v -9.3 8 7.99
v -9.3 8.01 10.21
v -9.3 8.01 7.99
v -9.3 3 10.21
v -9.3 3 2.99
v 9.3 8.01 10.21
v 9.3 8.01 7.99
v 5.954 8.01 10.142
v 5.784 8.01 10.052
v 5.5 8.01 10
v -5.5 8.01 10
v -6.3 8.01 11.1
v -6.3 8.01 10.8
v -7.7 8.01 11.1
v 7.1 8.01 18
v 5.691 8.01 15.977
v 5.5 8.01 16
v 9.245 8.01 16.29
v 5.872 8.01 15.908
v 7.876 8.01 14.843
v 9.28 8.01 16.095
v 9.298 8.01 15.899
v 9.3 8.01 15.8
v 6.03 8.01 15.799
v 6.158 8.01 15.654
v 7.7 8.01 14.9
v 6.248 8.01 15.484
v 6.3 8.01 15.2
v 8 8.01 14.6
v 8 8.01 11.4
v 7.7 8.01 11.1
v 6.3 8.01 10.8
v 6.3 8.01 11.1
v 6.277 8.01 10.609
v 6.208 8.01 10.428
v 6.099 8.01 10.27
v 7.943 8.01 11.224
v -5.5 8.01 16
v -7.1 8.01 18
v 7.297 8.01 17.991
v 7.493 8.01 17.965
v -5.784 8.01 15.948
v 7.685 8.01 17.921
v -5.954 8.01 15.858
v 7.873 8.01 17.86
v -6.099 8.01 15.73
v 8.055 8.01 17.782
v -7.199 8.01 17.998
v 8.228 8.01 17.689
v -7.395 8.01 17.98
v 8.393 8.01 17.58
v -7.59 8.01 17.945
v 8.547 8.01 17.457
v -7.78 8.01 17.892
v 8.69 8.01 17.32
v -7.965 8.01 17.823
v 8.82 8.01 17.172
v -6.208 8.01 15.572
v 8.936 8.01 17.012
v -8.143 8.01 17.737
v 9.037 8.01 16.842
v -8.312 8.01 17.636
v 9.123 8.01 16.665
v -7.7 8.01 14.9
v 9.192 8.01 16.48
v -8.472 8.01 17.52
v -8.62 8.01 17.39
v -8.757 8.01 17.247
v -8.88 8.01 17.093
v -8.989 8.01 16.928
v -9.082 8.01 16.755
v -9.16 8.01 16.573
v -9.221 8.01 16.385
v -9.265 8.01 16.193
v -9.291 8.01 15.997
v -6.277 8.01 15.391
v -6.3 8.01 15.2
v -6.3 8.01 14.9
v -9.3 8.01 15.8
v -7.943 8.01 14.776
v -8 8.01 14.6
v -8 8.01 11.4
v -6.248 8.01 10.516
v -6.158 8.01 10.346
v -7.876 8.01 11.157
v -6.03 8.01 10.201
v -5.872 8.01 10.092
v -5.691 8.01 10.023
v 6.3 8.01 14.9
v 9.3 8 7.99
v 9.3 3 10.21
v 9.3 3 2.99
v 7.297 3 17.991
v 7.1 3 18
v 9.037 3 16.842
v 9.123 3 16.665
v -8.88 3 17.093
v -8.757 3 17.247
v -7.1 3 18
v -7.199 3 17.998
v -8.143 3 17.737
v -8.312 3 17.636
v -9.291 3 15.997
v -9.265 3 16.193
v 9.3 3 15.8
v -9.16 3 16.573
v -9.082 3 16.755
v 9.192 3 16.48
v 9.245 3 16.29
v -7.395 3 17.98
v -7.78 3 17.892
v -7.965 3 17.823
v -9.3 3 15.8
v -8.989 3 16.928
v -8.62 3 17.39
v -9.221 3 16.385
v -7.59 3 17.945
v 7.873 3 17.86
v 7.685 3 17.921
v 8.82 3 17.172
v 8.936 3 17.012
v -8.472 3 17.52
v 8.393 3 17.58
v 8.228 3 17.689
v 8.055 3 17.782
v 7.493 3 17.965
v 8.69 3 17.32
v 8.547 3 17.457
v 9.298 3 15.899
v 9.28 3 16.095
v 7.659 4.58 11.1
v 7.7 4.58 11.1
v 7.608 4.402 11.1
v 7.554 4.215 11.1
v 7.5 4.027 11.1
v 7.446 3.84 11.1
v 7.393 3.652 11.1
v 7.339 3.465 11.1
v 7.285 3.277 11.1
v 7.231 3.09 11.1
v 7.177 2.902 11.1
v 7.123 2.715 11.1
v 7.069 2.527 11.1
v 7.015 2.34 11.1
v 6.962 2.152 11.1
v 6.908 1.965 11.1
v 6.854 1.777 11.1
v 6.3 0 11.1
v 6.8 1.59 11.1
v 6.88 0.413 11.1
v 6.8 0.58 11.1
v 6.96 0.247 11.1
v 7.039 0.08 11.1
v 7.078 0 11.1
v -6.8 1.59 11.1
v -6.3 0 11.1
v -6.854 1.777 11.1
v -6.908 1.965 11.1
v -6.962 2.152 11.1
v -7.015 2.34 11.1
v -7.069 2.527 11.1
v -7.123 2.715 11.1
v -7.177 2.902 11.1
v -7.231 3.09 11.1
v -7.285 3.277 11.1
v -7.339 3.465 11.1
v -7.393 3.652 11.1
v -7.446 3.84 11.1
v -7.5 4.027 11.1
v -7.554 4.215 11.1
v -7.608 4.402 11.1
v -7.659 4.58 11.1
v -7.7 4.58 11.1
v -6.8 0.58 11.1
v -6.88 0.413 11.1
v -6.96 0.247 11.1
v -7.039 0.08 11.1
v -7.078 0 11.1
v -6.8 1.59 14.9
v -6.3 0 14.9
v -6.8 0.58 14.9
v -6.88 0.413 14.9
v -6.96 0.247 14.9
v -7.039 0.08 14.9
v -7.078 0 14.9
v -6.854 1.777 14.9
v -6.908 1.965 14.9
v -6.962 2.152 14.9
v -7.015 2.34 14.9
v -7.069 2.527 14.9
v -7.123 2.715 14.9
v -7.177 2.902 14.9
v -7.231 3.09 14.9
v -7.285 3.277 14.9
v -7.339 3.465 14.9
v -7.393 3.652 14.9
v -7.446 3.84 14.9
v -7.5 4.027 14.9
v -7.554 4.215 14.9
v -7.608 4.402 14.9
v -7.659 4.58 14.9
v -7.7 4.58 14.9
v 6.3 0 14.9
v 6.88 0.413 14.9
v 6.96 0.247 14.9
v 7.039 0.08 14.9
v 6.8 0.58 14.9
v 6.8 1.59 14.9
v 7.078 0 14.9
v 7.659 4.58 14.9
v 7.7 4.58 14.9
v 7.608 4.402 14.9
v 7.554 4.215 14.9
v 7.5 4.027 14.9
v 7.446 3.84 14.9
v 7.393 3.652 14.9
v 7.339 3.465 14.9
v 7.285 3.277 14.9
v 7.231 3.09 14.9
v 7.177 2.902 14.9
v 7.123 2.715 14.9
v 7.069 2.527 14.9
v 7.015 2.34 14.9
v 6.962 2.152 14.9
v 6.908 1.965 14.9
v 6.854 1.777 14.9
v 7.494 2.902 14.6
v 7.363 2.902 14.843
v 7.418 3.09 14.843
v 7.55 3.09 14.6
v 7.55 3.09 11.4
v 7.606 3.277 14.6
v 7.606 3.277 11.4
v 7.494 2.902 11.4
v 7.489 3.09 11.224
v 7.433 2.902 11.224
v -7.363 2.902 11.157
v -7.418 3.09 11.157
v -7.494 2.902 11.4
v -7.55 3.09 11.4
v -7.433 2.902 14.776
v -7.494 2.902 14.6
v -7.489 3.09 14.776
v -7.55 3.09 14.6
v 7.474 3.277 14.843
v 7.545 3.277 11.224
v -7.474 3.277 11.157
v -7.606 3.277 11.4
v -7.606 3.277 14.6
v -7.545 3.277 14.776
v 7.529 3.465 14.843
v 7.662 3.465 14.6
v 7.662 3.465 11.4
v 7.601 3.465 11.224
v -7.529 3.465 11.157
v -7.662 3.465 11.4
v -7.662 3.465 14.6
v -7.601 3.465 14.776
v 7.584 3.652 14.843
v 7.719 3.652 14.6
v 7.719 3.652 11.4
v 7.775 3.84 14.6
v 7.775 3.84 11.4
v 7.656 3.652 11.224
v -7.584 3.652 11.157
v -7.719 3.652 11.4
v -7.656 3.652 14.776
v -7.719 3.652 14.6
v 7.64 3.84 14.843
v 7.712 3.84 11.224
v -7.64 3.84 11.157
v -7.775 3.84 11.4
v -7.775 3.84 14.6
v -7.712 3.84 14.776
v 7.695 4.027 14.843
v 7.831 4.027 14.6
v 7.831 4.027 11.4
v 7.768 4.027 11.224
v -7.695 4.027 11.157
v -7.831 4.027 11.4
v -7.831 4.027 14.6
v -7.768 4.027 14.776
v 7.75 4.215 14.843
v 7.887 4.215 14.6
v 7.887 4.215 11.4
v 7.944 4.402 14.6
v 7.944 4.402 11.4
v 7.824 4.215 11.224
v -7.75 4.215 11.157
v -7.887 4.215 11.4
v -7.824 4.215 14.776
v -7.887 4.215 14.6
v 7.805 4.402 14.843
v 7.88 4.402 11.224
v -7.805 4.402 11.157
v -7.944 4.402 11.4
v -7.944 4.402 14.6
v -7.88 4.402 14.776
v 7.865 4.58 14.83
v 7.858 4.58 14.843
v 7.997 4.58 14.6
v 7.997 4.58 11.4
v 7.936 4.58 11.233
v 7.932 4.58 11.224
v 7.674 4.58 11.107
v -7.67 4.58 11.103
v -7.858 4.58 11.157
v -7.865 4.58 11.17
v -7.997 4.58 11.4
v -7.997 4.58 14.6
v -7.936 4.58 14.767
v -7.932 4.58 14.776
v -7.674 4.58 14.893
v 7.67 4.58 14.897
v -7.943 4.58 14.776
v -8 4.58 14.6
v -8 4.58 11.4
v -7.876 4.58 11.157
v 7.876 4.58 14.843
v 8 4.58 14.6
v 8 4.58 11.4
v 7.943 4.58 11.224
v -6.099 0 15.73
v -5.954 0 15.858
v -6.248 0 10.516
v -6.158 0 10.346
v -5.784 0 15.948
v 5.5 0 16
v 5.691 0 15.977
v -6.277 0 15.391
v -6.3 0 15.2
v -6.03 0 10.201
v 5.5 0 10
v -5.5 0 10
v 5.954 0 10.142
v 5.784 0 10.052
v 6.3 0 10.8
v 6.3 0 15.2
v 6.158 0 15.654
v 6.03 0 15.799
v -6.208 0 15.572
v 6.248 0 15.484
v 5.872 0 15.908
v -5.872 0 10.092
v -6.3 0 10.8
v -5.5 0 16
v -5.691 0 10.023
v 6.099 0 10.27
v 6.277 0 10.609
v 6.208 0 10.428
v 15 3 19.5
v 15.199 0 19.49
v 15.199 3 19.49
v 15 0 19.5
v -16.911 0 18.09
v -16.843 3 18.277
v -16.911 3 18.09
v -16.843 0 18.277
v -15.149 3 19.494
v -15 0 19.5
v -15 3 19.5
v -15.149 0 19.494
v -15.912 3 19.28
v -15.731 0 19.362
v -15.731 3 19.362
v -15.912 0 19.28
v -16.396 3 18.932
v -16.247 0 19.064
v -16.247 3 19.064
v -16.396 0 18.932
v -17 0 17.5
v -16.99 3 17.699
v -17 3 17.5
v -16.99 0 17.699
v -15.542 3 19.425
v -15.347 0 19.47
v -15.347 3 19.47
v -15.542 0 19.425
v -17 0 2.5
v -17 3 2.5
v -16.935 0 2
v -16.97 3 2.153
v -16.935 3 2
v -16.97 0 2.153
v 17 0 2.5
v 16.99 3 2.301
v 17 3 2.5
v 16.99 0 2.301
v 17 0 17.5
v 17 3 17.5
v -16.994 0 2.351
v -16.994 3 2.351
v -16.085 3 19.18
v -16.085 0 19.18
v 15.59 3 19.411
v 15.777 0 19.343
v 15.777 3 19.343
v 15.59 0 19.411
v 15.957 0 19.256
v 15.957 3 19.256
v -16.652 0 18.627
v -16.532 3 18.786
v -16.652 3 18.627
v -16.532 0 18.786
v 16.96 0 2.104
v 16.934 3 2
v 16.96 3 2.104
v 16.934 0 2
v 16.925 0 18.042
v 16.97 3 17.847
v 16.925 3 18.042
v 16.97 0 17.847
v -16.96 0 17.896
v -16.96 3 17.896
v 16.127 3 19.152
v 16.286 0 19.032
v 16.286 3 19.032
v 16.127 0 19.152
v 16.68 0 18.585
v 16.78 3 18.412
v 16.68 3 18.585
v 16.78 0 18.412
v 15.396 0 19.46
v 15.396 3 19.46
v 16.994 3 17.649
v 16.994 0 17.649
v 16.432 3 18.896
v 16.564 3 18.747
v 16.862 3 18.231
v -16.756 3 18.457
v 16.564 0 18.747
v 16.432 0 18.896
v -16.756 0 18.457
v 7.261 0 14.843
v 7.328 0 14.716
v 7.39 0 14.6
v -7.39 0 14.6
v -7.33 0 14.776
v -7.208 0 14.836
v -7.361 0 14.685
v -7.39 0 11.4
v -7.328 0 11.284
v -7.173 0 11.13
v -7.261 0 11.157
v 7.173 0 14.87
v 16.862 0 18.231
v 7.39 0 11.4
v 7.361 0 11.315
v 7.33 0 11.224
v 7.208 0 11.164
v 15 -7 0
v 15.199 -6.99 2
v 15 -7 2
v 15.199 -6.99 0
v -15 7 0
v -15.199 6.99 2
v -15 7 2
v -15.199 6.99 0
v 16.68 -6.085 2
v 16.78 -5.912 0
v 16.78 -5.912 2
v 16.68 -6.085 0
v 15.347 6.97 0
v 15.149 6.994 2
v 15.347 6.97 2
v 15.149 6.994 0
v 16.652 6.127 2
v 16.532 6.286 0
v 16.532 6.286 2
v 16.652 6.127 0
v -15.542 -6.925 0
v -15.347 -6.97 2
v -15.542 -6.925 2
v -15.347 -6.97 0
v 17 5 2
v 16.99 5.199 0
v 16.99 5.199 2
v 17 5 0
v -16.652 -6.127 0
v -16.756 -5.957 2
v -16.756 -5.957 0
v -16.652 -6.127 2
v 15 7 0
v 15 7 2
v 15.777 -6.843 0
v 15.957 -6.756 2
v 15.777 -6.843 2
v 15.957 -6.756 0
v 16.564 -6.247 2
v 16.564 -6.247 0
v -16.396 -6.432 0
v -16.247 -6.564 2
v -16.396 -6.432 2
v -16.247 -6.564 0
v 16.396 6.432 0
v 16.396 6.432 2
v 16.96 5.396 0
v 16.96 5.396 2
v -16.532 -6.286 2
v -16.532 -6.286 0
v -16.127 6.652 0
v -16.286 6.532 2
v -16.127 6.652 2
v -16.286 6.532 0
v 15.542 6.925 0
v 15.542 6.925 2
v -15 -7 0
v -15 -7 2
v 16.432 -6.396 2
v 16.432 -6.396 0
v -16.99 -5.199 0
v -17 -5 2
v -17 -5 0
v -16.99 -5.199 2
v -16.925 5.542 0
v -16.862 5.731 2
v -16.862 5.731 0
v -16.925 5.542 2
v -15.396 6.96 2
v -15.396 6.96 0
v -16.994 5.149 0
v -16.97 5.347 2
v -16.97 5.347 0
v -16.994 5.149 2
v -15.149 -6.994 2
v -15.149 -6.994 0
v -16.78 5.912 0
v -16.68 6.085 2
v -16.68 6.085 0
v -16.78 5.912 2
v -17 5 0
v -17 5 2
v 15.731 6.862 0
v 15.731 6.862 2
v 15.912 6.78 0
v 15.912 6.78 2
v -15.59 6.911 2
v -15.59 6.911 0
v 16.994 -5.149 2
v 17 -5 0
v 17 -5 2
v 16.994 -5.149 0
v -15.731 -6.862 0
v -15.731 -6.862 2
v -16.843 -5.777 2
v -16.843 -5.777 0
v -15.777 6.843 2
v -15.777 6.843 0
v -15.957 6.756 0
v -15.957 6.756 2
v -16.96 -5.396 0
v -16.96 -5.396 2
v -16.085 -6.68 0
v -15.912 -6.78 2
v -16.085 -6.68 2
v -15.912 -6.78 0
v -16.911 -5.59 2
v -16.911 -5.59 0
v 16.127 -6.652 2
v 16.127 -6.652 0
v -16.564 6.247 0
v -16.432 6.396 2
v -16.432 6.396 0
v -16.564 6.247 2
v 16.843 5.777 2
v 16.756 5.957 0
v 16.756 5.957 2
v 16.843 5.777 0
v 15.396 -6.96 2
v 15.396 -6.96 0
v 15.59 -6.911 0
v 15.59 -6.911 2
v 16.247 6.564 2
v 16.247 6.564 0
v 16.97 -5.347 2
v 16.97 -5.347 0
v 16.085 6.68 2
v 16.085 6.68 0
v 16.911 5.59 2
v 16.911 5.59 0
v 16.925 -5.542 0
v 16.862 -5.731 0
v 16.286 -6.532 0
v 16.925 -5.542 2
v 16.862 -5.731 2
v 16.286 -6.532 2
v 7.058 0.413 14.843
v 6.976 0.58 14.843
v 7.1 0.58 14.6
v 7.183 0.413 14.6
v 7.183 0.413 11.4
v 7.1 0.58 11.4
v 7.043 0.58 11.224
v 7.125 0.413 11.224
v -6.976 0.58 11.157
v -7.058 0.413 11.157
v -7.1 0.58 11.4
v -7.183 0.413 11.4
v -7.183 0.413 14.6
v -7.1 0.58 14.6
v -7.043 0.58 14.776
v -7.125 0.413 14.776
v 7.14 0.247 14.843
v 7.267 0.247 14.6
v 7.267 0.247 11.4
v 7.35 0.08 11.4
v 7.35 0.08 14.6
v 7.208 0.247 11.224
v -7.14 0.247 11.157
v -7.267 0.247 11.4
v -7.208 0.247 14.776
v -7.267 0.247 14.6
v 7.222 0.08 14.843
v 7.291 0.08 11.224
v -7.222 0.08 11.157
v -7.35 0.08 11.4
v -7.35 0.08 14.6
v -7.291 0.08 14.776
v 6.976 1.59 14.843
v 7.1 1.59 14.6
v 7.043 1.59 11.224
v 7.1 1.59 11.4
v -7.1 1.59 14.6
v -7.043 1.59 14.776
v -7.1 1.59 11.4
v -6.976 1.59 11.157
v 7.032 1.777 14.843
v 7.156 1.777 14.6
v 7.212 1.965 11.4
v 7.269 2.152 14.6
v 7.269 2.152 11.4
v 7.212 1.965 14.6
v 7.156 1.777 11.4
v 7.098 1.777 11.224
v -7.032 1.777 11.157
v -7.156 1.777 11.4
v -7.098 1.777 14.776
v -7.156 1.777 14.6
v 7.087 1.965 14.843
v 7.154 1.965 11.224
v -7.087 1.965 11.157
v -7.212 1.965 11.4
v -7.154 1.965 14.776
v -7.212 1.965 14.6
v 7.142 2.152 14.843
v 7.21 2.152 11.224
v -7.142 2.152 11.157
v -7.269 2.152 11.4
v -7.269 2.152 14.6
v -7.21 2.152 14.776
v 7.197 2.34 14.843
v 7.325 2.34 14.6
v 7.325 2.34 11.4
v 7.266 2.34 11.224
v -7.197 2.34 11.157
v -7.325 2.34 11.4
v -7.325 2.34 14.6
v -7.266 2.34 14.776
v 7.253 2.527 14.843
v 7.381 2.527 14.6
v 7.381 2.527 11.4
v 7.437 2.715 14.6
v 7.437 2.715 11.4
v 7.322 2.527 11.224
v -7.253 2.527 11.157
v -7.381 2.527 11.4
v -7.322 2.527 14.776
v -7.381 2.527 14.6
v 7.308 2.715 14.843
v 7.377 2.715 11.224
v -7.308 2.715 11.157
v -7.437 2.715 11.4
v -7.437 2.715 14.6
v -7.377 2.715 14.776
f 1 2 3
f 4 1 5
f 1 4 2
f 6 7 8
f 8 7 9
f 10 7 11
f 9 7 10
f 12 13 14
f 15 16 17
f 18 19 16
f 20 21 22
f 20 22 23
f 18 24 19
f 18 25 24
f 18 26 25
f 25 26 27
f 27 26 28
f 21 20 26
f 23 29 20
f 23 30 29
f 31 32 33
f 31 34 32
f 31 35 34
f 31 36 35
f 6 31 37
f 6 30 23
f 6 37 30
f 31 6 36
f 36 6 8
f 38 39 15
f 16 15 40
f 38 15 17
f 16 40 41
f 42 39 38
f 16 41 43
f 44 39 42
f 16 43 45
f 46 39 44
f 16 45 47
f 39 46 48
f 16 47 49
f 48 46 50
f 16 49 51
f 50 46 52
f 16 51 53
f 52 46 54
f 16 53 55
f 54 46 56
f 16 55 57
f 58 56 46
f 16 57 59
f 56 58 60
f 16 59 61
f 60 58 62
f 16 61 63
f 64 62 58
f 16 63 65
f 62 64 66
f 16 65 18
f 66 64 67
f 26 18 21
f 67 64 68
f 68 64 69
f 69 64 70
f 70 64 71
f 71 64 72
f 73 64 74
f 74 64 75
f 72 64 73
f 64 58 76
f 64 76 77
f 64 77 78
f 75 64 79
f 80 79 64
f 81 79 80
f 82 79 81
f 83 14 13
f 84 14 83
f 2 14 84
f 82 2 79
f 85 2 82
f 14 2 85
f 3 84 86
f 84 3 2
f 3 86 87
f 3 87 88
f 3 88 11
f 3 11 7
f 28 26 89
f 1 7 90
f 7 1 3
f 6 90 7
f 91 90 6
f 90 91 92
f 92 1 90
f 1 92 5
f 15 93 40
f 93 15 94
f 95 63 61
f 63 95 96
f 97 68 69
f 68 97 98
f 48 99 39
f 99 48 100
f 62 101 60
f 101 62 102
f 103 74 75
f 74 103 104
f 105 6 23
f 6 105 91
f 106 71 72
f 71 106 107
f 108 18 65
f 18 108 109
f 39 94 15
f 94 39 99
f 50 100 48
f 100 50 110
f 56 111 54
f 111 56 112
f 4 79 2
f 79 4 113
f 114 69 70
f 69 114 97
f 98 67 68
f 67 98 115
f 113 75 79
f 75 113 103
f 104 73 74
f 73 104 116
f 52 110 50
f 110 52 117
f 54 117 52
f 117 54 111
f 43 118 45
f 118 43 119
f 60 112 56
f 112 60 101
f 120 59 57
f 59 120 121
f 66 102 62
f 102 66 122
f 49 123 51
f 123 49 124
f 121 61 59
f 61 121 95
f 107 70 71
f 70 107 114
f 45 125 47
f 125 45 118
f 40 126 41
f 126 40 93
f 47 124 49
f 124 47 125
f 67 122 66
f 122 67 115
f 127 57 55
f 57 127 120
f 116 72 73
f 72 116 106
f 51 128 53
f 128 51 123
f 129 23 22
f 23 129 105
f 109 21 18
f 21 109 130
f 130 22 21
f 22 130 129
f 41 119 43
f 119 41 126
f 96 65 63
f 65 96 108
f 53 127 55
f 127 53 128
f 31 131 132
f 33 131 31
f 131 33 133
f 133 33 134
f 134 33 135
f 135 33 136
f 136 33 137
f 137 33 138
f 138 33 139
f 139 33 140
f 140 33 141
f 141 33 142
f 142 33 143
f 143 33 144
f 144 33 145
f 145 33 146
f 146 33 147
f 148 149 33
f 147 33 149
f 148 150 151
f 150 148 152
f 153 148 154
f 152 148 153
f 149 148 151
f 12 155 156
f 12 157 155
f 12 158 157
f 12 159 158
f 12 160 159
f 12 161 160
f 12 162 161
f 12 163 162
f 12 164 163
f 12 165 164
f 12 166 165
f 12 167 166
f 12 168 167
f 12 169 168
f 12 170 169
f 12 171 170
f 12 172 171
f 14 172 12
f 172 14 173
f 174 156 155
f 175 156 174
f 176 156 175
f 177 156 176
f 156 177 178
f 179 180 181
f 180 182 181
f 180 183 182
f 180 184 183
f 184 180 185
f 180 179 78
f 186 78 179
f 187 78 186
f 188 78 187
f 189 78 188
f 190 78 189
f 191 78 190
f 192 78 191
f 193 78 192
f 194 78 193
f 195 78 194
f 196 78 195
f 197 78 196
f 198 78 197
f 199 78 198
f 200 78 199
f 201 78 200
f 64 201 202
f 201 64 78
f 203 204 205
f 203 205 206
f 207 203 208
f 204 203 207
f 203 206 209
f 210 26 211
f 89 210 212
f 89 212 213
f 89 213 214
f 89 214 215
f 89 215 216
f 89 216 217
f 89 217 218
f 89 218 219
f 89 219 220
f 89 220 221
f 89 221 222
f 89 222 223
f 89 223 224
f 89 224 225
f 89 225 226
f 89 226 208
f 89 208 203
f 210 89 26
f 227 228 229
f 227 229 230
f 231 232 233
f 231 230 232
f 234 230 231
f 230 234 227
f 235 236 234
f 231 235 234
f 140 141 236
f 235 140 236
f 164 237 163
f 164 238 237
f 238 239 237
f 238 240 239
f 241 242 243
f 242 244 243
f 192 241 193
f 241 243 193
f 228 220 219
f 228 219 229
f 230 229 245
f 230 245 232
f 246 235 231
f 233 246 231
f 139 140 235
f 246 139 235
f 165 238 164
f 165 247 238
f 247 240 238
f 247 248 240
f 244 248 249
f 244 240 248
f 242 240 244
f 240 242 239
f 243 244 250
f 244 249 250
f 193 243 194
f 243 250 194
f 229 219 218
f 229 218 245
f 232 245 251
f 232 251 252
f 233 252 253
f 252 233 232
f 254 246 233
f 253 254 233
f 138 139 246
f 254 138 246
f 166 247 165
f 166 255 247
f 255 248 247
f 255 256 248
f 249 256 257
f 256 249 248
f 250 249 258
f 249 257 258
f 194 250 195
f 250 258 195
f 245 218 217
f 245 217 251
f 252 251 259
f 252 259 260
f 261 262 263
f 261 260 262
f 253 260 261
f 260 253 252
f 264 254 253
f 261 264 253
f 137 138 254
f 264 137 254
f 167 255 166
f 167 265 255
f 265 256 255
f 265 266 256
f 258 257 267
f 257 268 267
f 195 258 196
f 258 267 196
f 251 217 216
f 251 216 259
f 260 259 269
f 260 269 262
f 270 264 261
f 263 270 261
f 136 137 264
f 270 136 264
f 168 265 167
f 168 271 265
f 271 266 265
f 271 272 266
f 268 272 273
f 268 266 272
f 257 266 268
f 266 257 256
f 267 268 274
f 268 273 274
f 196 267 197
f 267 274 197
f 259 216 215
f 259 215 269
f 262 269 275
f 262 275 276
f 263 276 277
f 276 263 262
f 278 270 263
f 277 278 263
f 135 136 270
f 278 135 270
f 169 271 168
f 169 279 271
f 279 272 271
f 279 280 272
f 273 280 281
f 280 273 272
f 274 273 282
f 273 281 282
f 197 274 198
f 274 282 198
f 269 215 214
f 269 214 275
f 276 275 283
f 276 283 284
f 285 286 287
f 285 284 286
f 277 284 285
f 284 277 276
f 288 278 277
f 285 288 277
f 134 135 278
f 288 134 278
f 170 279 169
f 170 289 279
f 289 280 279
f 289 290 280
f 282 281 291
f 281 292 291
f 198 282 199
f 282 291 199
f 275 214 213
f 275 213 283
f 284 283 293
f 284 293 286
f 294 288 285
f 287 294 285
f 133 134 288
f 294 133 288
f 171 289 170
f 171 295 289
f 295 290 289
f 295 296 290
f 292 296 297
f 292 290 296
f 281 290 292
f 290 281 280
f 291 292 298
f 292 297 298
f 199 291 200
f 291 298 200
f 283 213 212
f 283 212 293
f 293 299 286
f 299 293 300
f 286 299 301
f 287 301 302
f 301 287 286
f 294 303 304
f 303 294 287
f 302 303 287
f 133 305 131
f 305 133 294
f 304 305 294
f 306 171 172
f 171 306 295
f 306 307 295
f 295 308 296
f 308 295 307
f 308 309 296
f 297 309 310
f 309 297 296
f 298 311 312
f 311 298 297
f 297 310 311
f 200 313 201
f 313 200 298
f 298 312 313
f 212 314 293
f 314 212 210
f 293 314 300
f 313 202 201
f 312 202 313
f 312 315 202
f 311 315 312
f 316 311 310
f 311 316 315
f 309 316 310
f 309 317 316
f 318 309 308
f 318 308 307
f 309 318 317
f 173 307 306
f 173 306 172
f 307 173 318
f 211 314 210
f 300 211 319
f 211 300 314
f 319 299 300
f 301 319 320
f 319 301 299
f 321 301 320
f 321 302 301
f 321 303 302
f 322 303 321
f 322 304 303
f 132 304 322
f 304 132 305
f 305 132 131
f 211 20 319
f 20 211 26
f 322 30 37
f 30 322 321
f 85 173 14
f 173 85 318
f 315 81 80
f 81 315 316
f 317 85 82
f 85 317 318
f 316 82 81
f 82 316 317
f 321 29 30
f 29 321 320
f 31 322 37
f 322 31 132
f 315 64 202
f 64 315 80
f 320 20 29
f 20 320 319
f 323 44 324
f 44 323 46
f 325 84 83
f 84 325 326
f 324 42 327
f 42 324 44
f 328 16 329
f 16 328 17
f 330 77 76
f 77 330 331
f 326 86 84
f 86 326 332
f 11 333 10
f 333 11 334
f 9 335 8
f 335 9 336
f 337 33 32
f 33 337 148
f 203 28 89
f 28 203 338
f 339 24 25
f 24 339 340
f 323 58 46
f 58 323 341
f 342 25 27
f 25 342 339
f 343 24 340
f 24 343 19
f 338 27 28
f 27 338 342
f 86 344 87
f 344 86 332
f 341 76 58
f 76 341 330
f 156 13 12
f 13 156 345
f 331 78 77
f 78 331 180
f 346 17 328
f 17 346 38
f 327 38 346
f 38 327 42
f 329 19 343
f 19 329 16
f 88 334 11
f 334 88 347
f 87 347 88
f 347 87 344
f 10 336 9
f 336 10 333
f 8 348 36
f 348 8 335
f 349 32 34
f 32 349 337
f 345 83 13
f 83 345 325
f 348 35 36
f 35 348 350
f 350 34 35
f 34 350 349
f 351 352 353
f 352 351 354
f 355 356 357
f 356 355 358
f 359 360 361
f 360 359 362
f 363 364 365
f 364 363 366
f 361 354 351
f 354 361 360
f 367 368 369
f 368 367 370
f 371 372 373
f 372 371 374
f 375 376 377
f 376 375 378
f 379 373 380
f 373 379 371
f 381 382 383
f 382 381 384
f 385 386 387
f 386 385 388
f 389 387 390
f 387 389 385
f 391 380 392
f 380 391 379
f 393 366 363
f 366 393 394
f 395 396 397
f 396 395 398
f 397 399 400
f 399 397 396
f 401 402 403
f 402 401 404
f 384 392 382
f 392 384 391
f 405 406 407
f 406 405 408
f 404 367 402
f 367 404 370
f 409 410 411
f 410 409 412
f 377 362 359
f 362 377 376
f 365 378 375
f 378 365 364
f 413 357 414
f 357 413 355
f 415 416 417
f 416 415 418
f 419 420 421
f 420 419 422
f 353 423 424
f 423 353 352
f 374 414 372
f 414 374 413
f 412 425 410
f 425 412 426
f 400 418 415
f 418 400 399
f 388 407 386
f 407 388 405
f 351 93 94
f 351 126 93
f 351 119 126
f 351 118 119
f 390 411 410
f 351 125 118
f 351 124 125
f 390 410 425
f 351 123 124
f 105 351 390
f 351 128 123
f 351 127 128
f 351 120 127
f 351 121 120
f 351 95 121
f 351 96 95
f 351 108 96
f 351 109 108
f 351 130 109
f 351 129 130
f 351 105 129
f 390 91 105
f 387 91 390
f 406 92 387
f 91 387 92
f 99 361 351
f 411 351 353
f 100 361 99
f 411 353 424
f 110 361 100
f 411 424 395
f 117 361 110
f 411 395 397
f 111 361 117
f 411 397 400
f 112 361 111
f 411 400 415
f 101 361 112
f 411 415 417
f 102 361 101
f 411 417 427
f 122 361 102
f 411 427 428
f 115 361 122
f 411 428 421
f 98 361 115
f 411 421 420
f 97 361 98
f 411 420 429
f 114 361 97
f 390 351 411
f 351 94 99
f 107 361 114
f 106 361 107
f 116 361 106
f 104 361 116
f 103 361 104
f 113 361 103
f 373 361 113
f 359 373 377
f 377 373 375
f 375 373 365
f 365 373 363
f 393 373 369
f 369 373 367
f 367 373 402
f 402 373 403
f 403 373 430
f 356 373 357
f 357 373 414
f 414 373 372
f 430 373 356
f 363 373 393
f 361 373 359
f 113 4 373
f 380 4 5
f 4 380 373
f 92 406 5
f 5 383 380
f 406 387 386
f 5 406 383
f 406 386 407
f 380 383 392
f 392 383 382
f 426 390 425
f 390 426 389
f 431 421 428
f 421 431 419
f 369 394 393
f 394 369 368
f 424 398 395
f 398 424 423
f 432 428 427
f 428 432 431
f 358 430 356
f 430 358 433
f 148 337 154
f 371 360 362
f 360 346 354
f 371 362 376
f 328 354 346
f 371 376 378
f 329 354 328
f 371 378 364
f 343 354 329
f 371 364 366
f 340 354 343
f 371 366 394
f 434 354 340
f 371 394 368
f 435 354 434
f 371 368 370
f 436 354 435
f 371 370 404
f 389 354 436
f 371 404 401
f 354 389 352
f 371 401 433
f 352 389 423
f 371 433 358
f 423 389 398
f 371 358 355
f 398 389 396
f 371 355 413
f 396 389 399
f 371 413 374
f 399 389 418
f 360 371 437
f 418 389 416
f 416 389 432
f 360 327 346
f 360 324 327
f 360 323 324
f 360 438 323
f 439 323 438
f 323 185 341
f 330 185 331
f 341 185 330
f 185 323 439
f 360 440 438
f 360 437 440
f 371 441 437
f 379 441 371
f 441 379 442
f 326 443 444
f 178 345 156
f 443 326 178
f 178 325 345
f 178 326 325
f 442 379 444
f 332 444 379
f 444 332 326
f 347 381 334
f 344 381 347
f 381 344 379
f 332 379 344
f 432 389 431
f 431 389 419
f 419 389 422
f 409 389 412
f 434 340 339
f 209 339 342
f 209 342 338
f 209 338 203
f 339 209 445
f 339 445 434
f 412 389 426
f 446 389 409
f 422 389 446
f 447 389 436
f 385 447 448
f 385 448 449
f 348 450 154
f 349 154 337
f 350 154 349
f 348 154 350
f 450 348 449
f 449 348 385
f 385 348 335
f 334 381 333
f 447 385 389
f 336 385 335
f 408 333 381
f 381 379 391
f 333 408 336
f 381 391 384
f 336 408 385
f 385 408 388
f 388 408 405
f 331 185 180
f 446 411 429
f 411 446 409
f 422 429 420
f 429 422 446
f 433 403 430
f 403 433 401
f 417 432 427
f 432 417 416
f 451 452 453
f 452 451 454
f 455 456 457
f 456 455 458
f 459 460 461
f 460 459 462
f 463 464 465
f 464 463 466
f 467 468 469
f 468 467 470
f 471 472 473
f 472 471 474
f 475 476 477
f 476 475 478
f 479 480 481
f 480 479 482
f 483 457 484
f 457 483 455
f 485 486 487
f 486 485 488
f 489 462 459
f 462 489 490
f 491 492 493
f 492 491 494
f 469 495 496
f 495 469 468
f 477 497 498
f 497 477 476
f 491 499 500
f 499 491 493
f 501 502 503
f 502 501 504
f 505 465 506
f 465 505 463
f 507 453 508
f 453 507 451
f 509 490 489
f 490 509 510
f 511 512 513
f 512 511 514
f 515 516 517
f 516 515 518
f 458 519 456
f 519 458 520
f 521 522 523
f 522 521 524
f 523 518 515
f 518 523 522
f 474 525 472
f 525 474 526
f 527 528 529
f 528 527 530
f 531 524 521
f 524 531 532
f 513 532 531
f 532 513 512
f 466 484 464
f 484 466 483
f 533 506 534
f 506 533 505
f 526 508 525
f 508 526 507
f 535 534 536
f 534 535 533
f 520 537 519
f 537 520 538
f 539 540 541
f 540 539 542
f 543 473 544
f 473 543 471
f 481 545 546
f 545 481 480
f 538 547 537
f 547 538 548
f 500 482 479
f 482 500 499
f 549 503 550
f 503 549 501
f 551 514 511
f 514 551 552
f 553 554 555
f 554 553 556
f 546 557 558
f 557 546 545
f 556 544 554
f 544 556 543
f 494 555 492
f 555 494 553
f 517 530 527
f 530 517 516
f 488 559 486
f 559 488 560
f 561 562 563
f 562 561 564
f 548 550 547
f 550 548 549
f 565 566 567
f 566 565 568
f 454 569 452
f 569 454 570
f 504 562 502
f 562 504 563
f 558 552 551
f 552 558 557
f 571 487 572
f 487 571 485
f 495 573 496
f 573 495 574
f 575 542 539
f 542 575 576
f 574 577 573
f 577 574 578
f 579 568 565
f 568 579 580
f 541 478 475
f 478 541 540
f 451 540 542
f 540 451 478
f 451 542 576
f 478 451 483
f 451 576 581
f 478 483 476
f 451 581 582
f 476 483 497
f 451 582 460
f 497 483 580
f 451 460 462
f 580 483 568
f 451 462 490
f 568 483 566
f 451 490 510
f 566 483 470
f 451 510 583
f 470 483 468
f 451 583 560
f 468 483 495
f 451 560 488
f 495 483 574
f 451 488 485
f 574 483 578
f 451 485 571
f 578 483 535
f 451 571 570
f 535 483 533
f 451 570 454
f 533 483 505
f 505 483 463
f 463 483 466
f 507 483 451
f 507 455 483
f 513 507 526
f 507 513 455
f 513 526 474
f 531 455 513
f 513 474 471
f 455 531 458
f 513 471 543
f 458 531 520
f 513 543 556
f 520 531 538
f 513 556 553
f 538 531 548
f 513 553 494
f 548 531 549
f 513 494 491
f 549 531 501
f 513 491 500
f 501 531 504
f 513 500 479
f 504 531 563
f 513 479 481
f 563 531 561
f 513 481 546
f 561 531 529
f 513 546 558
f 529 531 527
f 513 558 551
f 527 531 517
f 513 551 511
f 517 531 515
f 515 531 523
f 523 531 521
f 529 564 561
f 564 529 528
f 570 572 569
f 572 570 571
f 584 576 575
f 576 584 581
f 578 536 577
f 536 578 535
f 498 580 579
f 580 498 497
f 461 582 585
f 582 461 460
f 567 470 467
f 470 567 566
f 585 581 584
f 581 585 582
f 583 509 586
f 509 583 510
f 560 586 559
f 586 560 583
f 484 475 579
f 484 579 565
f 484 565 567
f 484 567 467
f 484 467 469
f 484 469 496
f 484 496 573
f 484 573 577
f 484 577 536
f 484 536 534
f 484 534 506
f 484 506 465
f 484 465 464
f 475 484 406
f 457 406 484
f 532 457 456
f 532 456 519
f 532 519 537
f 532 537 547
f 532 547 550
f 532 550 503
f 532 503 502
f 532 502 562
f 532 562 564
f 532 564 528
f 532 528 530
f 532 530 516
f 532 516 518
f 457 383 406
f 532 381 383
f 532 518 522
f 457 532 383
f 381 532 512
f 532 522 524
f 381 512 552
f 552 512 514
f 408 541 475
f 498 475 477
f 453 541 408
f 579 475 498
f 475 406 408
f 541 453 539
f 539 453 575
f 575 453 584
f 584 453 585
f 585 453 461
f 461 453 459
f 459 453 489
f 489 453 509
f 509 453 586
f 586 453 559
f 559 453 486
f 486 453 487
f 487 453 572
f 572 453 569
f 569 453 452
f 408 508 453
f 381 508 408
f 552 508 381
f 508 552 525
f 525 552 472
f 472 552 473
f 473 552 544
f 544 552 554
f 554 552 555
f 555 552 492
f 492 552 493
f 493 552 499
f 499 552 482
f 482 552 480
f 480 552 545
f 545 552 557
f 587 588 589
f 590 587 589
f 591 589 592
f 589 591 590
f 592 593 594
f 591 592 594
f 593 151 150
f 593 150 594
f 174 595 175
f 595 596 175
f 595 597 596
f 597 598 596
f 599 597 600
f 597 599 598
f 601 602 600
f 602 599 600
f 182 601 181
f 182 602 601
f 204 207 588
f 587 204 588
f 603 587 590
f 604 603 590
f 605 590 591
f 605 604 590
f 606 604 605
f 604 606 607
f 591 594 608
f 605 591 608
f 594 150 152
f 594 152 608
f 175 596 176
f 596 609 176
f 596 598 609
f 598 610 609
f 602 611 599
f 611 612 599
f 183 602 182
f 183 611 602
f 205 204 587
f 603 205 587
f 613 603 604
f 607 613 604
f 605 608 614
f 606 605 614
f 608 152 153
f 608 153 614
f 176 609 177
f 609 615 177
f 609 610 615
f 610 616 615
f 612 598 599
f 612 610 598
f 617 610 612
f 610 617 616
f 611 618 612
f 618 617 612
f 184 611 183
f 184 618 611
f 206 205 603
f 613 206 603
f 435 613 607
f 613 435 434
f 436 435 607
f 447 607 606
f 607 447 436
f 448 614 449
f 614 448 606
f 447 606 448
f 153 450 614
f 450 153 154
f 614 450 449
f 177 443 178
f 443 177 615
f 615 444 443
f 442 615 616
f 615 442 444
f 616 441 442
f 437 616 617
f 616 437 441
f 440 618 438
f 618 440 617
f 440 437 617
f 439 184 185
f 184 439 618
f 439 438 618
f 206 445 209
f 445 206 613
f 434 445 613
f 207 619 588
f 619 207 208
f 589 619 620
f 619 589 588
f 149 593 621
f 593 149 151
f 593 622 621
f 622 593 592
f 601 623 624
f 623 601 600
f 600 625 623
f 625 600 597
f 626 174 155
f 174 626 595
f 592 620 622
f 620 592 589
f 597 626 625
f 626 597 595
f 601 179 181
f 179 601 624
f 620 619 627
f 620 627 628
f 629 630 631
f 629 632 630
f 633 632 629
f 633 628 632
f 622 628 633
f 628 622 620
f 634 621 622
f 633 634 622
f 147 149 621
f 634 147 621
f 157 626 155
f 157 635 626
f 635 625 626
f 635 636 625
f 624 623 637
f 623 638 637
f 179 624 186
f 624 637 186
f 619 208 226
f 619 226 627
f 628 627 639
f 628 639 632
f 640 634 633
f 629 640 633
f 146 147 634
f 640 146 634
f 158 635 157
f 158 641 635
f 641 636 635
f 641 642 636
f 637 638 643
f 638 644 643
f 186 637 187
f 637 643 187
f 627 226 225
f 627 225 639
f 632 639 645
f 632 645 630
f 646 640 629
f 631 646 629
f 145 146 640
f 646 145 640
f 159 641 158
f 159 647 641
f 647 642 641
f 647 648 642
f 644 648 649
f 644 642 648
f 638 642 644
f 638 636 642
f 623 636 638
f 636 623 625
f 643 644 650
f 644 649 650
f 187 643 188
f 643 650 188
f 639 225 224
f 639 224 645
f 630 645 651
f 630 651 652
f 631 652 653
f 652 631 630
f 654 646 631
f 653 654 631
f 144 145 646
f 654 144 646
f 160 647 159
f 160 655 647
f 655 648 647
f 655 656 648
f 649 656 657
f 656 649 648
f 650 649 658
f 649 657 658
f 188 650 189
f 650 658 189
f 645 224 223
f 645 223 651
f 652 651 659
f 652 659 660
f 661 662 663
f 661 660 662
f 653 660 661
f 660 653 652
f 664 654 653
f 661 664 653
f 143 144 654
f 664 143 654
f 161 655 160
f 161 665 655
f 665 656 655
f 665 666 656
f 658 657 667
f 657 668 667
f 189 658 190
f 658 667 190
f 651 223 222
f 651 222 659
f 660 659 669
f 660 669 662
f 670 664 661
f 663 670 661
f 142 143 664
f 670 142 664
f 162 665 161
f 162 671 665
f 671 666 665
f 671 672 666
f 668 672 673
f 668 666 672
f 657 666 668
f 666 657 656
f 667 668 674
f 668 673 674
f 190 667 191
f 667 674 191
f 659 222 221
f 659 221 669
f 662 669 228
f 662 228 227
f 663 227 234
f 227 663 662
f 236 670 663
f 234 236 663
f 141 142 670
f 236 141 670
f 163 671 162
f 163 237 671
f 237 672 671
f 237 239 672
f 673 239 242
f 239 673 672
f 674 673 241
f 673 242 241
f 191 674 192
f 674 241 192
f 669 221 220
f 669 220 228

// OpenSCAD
$fa = 2; $fs = 0.2;

eps = 0.01;

usb_c_width = 5.6;
usb_c_length = 12.2;
usb_c_depth = 8;
usb_c_clip_width = 3.8;
usb_c_clip_length = 14.2;

function usb_c_receptible_width() = usb_c_width + 4;
function usb_c_receptible_length() = usb_c_length + 4;

// https://www.amazon.de/dp/B0CL9DYD76
// USB-C-Buchse für Panelmontage 3A
module usb_c_receptible(support = false, tolerance = 0.2) {
    o = 4 + 2 * tolerance;
    difference() {
        union() {
            translate([0, eps, 0])
                rotate([-90, 0, 0]) {
                   linear_extrude(usb_c_depth)
                        offset(o / 2)
                            square([usb_c_clip_length, usb_c_width], center = true);

                    if (support) {
                        translate([0, usb_c_width / 2 - eps, 0])
                            linear_extrude(usb_c_depth)
                                translate([-(usb_c_clip_length + o) / 2, 0])
                                    square([usb_c_clip_length + o, o / 2 + 2 * eps]);

                        translate([0, usb_c_width / 2 + o / 2, 0])
                            linear_extrude(usb_c_depth, scale = [1, 0])
                                translate([0, usb_c_depth / 2])
                                    square([usb_c_clip_length + o, usb_c_depth], center = true);
                        }
                    }
        }
        usb_c_receptible_neg(tolerance);
    }
}

module usb_c_receptible_neg(tolerance = 0.2) {
    translate([0, -eps, 0])
        rotate([-90, 0, 0])
            linear_extrude(usb_c_depth + 1)
                offset(0.6 + tolerance) offset(-0.6)
                    square([usb_c_length, usb_c_width], center = true);

    h1 = 1.6;
    h2 = 3;
	h2s = 1.8;
    translate([0, -eps, 0])
        rotate([-90, 0, 0]) {
            translate([0, 0, -eps + 0.6])
                mirror([0, 0, 1])
                    linear_extrude(1, scale = [(usb_c_clip_length + 1) / usb_c_clip_length, 1])
                        offset(0.3) offset(-0.3)
                            square([usb_c_clip_length, usb_c_clip_width], center = true);
            translate([0, 0, -eps])
                linear_extrude(h1 + 2 * eps)
                    offset(0.3) offset(-0.3)
                        square([usb_c_clip_length, usb_c_clip_width], center = true);
            translate([0, 0, h1])
                linear_extrude(h2, scale = [(usb_c_clip_length + h2s) / usb_c_clip_length, 1])
                    offset(0.3) offset(-0.3)
                        square([usb_c_clip_length, usb_c_clip_width], center = true);
            translate([0, 0, h1 + h2 - eps])
                linear_extrude(usb_c_depth - h2)
                    offset(0.3) offset(-0.3)
                        square([usb_c_clip_length + h2s, usb_c_clip_width], center = true);
        }
}

module usb_c_receptible_test() {
    difference() {
        h = 13;
        union() {
            translate([0, 0, 10])
                rotate([-90, 0, 0])
                    linear_extrude(3)
                        offset(2)
                            square([30, 15], center = true);

            linear_extrude(2)
                offset(2)
                    square([30, 10], center = true);
            translate([0, 0, h])
                usb_c_receptible(support = true);
        }
        translate([0, 0, h])
            usb_c_receptible_neg();
    }
}

usb_c_receptible_test();
